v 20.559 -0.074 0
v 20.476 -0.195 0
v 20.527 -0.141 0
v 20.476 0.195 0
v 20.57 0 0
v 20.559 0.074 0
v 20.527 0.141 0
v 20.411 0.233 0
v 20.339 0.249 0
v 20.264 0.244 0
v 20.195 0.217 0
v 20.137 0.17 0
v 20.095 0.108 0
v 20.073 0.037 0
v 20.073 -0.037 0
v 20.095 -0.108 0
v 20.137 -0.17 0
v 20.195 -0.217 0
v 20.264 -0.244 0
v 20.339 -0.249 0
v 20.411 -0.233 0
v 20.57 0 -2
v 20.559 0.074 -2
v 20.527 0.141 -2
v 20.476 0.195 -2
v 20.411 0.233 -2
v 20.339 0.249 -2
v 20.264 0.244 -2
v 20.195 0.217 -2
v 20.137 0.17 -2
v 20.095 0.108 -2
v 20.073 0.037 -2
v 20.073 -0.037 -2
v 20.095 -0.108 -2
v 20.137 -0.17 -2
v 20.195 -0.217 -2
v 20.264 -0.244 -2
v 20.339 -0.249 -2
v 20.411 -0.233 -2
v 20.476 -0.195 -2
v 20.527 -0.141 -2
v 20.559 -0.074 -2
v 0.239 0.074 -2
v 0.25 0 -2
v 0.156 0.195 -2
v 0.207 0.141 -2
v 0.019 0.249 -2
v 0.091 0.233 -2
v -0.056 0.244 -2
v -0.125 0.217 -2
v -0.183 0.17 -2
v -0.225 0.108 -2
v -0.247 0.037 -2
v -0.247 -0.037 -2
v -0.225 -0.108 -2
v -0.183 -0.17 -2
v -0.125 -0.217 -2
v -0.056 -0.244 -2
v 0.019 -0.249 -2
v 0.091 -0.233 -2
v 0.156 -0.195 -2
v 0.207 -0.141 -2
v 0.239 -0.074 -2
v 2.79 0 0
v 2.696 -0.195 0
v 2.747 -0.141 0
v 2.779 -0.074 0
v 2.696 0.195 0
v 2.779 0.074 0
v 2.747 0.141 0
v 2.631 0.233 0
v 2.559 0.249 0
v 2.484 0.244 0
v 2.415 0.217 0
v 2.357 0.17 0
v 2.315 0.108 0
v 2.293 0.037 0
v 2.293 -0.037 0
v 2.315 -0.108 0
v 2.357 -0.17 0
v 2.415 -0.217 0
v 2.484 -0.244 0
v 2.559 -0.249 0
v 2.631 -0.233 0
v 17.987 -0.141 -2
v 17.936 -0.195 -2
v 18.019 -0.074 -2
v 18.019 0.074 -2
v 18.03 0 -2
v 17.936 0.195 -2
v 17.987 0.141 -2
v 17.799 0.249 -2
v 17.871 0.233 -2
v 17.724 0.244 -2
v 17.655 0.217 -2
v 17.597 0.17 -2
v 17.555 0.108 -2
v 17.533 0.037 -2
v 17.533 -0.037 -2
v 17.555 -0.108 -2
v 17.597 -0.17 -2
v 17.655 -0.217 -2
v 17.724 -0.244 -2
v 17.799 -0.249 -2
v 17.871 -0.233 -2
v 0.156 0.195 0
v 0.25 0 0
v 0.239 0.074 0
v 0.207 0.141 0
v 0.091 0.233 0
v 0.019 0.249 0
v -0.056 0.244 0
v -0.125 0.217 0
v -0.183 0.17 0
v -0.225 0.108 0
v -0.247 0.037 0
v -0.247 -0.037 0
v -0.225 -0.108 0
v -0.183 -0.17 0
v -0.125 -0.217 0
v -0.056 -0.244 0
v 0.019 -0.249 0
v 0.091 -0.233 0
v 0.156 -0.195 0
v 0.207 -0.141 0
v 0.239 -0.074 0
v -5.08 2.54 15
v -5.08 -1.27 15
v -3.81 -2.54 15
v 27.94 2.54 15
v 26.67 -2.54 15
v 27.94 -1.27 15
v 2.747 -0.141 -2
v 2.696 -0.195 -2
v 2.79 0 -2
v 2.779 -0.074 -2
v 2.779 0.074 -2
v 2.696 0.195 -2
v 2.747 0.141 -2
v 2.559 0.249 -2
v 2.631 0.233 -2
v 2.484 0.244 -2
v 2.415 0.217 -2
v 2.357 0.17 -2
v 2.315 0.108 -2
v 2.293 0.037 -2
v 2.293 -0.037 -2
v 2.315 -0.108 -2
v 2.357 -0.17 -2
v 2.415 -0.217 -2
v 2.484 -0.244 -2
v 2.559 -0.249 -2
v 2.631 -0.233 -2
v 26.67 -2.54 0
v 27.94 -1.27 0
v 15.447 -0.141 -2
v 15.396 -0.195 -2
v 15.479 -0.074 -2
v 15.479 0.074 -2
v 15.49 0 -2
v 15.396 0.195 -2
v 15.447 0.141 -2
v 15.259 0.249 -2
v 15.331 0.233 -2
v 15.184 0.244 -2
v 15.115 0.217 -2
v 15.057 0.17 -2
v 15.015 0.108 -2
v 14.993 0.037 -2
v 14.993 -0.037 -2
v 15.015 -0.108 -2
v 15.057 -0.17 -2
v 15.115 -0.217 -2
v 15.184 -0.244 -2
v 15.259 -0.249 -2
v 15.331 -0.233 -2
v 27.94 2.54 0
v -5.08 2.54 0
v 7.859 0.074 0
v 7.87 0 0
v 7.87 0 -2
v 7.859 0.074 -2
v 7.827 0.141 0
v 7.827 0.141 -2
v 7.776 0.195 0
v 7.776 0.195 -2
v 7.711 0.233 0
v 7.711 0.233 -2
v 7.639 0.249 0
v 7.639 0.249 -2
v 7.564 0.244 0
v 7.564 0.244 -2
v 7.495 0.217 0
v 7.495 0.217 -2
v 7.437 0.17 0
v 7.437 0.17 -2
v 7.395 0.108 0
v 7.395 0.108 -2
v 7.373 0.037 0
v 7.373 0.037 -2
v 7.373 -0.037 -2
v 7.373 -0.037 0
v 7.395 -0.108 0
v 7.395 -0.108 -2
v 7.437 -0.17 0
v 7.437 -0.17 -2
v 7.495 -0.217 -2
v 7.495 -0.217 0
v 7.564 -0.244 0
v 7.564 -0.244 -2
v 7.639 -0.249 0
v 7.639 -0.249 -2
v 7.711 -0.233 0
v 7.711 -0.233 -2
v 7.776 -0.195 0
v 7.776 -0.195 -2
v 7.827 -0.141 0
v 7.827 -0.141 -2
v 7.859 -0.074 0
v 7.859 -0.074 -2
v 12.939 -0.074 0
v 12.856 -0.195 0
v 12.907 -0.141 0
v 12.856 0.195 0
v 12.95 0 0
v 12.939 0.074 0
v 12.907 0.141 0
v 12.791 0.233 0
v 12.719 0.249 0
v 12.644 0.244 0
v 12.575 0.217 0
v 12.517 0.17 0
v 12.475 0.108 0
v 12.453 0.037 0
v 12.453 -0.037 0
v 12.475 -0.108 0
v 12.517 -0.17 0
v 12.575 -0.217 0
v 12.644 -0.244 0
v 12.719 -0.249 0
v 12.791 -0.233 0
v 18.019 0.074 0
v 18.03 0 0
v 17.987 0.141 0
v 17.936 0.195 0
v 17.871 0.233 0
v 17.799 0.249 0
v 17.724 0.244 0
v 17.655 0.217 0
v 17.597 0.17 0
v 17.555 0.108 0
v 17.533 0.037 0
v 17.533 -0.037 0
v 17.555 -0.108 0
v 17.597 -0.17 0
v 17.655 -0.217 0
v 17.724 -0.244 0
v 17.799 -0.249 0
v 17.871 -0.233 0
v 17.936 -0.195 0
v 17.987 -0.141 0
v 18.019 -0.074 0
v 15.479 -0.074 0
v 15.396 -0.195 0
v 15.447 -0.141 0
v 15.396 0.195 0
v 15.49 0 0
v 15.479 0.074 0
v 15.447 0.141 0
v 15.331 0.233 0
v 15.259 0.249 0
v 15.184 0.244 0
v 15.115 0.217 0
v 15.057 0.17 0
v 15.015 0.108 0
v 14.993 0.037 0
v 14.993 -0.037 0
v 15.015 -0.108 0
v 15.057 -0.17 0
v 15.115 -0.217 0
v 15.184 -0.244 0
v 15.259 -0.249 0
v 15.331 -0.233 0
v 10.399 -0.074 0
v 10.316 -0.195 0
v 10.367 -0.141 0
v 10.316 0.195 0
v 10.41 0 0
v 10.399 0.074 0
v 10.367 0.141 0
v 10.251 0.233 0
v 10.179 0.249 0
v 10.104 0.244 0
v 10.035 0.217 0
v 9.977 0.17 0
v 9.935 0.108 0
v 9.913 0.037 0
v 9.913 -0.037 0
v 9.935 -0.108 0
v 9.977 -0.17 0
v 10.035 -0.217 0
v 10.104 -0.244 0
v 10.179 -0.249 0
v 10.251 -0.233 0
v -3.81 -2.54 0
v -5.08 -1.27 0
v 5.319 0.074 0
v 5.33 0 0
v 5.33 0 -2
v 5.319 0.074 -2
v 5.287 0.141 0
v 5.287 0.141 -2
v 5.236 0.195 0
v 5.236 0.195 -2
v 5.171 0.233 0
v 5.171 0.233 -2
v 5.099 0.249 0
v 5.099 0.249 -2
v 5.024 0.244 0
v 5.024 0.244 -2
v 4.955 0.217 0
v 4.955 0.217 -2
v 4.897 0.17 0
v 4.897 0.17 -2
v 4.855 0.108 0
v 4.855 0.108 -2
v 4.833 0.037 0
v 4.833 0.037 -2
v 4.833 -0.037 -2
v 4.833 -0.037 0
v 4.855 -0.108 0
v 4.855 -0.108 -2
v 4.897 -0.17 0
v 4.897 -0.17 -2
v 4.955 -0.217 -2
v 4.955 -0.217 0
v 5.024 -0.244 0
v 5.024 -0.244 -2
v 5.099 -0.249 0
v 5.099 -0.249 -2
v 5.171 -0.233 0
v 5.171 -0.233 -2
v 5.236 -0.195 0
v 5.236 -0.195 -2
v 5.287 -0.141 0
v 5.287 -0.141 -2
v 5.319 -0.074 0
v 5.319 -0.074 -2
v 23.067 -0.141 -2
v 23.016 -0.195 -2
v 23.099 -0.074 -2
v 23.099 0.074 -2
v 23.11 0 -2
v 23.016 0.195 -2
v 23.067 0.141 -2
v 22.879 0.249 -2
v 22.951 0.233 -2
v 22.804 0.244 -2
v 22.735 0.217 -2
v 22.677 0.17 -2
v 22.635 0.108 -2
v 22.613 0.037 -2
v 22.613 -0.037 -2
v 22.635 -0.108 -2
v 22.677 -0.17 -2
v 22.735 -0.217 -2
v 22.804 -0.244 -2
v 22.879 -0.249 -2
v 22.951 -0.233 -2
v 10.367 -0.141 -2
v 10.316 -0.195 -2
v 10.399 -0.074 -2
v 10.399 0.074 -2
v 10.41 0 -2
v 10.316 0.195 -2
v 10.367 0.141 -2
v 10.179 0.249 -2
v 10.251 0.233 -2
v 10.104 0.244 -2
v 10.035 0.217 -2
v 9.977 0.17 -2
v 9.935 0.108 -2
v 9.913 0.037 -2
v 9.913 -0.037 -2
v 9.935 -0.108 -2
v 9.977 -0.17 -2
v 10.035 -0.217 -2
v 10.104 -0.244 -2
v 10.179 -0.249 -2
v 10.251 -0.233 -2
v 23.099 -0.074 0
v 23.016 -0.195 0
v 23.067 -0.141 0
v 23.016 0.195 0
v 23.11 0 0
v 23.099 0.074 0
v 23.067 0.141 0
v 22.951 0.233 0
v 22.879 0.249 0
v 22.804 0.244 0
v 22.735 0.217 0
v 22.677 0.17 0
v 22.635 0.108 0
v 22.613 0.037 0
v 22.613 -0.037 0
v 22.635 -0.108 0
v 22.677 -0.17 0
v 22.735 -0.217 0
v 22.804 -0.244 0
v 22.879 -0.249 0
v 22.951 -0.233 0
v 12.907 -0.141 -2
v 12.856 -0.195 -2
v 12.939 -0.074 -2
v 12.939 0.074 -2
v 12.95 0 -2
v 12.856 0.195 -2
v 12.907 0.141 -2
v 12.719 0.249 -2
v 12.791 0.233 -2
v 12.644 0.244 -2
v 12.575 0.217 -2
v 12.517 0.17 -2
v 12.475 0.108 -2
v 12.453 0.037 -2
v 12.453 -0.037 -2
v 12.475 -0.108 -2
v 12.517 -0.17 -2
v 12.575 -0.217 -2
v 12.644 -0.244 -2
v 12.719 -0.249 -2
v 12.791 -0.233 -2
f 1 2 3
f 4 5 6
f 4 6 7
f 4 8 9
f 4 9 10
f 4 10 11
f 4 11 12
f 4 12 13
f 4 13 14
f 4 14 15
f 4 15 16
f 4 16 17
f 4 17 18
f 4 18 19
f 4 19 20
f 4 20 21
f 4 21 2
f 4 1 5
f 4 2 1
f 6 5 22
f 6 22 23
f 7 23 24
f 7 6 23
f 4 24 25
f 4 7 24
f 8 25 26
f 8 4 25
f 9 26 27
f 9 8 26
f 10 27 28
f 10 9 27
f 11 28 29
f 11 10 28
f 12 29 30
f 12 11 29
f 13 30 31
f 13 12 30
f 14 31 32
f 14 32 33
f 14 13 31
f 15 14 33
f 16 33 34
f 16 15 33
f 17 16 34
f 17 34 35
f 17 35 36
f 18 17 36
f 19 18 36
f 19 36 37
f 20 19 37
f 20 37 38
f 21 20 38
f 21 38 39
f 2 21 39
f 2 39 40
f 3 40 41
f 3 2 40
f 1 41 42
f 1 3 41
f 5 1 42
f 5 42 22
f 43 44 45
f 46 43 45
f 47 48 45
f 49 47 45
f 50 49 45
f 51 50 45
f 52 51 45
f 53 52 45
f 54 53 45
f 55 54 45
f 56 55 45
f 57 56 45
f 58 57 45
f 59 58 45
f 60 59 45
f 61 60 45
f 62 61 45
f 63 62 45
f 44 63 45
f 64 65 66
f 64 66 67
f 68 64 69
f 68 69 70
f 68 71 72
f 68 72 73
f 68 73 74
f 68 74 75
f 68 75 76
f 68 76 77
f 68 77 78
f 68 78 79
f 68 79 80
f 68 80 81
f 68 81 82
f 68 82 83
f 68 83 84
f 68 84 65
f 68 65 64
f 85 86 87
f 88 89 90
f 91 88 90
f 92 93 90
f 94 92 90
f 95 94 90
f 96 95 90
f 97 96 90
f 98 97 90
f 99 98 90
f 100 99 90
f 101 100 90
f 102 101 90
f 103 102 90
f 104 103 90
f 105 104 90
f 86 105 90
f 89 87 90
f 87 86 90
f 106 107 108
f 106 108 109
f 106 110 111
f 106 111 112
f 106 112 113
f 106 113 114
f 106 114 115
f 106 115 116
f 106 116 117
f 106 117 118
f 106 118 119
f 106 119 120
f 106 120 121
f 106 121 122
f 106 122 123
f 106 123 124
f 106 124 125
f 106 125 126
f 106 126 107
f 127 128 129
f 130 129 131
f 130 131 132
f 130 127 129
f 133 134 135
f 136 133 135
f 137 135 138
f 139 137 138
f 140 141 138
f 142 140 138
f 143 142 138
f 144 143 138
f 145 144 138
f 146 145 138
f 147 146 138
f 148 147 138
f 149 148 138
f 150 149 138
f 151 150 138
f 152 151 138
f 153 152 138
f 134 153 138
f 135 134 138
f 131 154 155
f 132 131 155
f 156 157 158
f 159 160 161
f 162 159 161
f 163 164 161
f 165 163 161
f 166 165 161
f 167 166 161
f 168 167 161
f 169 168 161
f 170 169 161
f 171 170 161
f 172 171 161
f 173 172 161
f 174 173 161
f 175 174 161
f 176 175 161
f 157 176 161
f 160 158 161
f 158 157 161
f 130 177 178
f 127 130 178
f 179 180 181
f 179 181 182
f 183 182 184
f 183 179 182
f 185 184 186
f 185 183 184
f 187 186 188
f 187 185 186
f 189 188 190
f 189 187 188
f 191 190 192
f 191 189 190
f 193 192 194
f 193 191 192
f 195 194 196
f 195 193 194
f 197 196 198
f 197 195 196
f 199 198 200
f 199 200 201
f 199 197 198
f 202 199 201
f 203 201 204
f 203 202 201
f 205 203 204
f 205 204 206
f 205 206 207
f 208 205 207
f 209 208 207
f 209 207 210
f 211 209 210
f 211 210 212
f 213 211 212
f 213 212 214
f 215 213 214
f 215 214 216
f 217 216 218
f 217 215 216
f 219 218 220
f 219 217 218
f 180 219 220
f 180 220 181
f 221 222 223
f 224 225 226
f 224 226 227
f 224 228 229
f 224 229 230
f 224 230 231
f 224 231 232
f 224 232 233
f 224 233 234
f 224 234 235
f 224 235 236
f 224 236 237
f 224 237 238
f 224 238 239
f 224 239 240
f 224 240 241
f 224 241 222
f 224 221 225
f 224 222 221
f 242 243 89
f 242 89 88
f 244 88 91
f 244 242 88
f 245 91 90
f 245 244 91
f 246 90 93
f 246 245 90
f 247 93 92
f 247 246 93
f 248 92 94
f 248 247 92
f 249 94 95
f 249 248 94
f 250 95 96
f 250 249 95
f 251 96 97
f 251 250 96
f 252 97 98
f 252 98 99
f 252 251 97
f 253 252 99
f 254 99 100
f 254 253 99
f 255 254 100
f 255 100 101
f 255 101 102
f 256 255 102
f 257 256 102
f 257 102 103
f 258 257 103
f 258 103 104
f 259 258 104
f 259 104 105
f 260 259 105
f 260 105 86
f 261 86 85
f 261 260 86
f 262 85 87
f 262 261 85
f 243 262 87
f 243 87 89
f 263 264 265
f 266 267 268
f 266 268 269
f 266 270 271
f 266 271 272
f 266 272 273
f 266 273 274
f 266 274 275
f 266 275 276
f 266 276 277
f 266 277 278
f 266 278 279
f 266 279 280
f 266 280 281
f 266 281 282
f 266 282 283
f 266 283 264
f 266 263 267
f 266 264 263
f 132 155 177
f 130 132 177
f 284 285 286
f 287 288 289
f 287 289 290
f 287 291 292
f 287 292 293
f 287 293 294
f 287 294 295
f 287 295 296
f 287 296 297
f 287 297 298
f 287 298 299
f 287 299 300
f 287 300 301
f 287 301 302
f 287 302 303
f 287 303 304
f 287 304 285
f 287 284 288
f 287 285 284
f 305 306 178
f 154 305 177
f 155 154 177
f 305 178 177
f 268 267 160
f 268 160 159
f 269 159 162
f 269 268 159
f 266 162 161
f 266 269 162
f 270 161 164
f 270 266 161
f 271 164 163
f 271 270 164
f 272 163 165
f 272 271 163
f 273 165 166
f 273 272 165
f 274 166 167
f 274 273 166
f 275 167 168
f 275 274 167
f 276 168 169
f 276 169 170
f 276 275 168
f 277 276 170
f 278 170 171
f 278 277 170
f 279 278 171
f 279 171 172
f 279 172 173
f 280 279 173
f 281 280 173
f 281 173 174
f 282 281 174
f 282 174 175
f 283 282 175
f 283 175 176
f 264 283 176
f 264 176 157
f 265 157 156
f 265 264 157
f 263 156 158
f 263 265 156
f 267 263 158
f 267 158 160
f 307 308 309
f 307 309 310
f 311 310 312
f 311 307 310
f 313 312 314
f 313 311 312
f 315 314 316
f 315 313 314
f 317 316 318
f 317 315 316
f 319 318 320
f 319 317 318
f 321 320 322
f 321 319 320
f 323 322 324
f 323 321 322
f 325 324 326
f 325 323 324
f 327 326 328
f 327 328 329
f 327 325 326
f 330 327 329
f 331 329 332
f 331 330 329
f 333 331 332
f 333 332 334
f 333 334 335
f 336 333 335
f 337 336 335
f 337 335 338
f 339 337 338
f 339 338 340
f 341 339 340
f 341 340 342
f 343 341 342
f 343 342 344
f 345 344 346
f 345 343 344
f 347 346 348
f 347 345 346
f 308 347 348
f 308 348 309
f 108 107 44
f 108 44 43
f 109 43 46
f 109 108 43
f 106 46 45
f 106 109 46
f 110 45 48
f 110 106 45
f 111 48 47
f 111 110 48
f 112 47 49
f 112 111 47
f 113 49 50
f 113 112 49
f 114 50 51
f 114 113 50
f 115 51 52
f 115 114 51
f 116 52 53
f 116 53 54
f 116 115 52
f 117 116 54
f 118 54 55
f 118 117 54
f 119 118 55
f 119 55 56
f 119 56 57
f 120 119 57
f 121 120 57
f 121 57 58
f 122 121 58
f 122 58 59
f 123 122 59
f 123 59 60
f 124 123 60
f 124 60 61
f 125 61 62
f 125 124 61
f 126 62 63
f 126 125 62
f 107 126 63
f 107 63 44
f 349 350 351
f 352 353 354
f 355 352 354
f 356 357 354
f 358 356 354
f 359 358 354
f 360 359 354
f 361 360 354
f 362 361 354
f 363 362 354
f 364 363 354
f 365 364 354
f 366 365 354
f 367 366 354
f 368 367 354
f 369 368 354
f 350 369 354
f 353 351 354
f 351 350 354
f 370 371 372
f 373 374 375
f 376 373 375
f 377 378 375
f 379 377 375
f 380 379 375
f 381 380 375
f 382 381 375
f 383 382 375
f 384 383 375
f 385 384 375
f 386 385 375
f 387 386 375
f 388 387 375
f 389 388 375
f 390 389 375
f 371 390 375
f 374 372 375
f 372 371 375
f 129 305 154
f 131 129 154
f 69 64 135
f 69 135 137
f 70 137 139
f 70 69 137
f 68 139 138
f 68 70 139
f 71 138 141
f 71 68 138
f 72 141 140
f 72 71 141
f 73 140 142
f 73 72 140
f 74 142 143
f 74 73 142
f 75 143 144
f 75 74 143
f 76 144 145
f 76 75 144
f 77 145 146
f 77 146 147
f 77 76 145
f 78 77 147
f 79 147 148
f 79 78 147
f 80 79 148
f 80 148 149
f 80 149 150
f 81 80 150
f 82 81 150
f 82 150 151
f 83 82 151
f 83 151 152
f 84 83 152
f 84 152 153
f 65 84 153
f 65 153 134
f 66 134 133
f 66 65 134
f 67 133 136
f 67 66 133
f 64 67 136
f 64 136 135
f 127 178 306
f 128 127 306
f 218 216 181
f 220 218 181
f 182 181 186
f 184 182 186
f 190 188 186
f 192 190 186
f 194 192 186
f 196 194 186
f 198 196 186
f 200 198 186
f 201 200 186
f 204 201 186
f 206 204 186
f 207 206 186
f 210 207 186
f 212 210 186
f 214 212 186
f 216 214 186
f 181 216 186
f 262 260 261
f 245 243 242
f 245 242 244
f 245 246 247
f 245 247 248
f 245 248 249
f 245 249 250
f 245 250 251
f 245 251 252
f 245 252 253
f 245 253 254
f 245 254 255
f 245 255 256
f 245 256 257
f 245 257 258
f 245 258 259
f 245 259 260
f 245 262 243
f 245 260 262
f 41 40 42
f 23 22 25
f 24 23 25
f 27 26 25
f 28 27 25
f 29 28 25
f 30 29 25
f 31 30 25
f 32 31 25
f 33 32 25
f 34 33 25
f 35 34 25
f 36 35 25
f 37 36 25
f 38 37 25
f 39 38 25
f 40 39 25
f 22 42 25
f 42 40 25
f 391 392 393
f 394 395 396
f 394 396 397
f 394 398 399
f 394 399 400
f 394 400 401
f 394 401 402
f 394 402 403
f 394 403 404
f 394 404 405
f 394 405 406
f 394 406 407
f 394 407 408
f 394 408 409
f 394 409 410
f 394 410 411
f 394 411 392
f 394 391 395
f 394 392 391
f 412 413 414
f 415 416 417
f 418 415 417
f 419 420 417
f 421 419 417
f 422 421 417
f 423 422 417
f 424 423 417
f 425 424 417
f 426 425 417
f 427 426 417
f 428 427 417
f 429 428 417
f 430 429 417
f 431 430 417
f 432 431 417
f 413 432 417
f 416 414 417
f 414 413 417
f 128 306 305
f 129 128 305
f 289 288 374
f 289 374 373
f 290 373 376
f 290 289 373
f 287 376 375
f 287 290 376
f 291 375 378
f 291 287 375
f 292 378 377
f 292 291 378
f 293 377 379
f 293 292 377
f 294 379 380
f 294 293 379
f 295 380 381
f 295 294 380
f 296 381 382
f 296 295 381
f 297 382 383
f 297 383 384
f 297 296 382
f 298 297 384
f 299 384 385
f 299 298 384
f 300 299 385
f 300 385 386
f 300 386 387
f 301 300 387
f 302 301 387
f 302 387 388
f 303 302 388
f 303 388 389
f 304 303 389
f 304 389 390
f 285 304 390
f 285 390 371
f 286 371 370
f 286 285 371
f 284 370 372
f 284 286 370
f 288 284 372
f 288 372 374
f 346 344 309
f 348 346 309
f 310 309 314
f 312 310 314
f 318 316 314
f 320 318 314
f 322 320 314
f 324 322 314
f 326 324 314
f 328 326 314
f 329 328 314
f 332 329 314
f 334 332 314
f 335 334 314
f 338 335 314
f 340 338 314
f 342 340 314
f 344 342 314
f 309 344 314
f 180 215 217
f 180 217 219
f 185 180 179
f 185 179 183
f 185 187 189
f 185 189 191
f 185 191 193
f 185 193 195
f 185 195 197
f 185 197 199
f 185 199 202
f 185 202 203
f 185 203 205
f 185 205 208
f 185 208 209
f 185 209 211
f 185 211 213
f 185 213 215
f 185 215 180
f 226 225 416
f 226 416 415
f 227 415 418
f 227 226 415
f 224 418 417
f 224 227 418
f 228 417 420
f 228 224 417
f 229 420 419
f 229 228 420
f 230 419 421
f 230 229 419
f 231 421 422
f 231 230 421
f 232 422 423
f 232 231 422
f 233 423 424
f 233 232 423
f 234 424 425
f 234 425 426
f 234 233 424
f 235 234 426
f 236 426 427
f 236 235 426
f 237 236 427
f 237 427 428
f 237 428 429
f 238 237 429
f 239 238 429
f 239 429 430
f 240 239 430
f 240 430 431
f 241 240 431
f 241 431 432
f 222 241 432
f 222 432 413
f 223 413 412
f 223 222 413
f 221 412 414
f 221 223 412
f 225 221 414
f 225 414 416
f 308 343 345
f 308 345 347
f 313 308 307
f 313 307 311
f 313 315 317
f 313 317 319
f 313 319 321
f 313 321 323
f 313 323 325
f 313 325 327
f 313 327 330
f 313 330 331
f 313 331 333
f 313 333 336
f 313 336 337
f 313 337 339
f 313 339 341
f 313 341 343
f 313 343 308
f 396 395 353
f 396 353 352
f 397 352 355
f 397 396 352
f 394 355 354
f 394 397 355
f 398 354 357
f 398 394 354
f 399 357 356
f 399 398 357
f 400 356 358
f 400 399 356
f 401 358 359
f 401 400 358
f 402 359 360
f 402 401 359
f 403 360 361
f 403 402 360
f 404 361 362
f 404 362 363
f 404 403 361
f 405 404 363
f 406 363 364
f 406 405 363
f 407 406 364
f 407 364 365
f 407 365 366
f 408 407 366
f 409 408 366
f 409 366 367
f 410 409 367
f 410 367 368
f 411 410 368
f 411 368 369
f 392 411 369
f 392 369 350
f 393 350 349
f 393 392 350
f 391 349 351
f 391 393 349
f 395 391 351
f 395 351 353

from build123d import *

# Parameters (mm, degrees)
COMPONENT_OUTLINE_DEPTH = 15
SKETCH2_R               = 0.25
EXTRUDE_1_DEPTH         = 2
SKETCH3_R               = 0.25
EXTRUDE_2_DEPTH         = 2
SKETCH4_R               = 0.25
EXTRUDE_3_DEPTH         = 2
SKETCH5_R               = 0.25
EXTRUDE_4_DEPTH         = 2
SKETCH6_R               = 0.25
EXTRUDE_5_DEPTH         = 2
SKETCH7_R               = 0.25
EXTRUDE_6_DEPTH         = 2
SKETCH8_R               = 0.25
EXTRUDE_7_DEPTH         = 2
SKETCH9_R               = 0.25
EXTRUDE_8_DEPTH         = 2
SKETCH10_R              = 0.25
EXTRUDE_9_DEPTH         = 2
SKETCH11_R              = 0.25
EXTRUDE_10_DEPTH        = 2


with BuildPart() as part:
    # Sketch1 → Component_Outline (new body)
    with BuildSketch(Plane.XY):
        Polygon((-5.08, 2.54), (-5.08, -1.27), (-3.81, -2.54), (26.67, -2.54), (27.94, -1.27), (27.94, 2.54), align=None)
    extrude(amount=COMPONENT_OUTLINE_DEPTH)


with BuildPart() as body_2:
    # Sketch2 → Extrude 1 (new body)
    with BuildSketch(Plane.XY):
        Circle(SKETCH2_R)
    extrude(amount=-EXTRUDE_1_DEPTH)


with BuildPart() as body_3:
    # Sketch3 → Extrude 2 (new body)
    with BuildSketch(Plane.XY):
        with Locations((2.54, 0)):
            Circle(SKETCH3_R)
    extrude(amount=-EXTRUDE_2_DEPTH)


with BuildPart() as body_4:
    # Sketch4 → Extrude 3 (new body)
    with BuildSketch(Plane.XY):
        with Locations((5.08, 0)):
            Circle(SKETCH4_R)
    extrude(amount=-EXTRUDE_3_DEPTH)


with BuildPart() as body_5:
    # Sketch5 → Extrude 4 (new body)
    with BuildSketch(Plane.XY):
        with Locations((7.62, 0)):
            Circle(SKETCH5_R)
    extrude(amount=-EXTRUDE_4_DEPTH)


with BuildPart() as body_6:
    # Sketch6 → Extrude 5 (new body)
    with BuildSketch(Plane.XY):
        with Locations((10.16, 0)):
            Circle(SKETCH6_R)
    extrude(amount=-EXTRUDE_5_DEPTH)


with BuildPart() as body_7:
    # Sketch7 → Extrude 6 (new body)
    with BuildSketch(Plane.XY):
        with Locations((12.7, 0)):
            Circle(SKETCH7_R)
    extrude(amount=-EXTRUDE_6_DEPTH)


with BuildPart() as body_8:
    # Sketch8 → Extrude 7 (new body)
    with BuildSketch(Plane.XY):
        with Locations((15.24, 0)):
            Circle(SKETCH8_R)
    extrude(amount=-EXTRUDE_7_DEPTH)


with BuildPart() as body_9:
    # Sketch9 → Extrude 8 (new body)
    with BuildSketch(Plane.XY):
        with Locations((17.78, 0)):
            Circle(SKETCH9_R)
    extrude(amount=-EXTRUDE_8_DEPTH)


with BuildPart() as body_10:
    # Sketch10 → Extrude 9 (new body)
    with BuildSketch(Plane.XY):
        with Locations((20.32, 0)):
            Circle(SKETCH10_R)
    extrude(amount=-EXTRUDE_9_DEPTH)


with BuildPart() as body_11:
    # Sketch11 → Extrude 10 (new body)
    with BuildSketch(Plane.XY):
        with Locations((22.86, 0)):
            Circle(SKETCH11_R)
    extrude(amount=-EXTRUDE_10_DEPTH)


solid = Compound([part.part, body_2.part, body_3.part, body_4.part, body_5.part, body_6.part, body_7.part, body_8.part, body_9.part, body_10.part, body_11.part])
